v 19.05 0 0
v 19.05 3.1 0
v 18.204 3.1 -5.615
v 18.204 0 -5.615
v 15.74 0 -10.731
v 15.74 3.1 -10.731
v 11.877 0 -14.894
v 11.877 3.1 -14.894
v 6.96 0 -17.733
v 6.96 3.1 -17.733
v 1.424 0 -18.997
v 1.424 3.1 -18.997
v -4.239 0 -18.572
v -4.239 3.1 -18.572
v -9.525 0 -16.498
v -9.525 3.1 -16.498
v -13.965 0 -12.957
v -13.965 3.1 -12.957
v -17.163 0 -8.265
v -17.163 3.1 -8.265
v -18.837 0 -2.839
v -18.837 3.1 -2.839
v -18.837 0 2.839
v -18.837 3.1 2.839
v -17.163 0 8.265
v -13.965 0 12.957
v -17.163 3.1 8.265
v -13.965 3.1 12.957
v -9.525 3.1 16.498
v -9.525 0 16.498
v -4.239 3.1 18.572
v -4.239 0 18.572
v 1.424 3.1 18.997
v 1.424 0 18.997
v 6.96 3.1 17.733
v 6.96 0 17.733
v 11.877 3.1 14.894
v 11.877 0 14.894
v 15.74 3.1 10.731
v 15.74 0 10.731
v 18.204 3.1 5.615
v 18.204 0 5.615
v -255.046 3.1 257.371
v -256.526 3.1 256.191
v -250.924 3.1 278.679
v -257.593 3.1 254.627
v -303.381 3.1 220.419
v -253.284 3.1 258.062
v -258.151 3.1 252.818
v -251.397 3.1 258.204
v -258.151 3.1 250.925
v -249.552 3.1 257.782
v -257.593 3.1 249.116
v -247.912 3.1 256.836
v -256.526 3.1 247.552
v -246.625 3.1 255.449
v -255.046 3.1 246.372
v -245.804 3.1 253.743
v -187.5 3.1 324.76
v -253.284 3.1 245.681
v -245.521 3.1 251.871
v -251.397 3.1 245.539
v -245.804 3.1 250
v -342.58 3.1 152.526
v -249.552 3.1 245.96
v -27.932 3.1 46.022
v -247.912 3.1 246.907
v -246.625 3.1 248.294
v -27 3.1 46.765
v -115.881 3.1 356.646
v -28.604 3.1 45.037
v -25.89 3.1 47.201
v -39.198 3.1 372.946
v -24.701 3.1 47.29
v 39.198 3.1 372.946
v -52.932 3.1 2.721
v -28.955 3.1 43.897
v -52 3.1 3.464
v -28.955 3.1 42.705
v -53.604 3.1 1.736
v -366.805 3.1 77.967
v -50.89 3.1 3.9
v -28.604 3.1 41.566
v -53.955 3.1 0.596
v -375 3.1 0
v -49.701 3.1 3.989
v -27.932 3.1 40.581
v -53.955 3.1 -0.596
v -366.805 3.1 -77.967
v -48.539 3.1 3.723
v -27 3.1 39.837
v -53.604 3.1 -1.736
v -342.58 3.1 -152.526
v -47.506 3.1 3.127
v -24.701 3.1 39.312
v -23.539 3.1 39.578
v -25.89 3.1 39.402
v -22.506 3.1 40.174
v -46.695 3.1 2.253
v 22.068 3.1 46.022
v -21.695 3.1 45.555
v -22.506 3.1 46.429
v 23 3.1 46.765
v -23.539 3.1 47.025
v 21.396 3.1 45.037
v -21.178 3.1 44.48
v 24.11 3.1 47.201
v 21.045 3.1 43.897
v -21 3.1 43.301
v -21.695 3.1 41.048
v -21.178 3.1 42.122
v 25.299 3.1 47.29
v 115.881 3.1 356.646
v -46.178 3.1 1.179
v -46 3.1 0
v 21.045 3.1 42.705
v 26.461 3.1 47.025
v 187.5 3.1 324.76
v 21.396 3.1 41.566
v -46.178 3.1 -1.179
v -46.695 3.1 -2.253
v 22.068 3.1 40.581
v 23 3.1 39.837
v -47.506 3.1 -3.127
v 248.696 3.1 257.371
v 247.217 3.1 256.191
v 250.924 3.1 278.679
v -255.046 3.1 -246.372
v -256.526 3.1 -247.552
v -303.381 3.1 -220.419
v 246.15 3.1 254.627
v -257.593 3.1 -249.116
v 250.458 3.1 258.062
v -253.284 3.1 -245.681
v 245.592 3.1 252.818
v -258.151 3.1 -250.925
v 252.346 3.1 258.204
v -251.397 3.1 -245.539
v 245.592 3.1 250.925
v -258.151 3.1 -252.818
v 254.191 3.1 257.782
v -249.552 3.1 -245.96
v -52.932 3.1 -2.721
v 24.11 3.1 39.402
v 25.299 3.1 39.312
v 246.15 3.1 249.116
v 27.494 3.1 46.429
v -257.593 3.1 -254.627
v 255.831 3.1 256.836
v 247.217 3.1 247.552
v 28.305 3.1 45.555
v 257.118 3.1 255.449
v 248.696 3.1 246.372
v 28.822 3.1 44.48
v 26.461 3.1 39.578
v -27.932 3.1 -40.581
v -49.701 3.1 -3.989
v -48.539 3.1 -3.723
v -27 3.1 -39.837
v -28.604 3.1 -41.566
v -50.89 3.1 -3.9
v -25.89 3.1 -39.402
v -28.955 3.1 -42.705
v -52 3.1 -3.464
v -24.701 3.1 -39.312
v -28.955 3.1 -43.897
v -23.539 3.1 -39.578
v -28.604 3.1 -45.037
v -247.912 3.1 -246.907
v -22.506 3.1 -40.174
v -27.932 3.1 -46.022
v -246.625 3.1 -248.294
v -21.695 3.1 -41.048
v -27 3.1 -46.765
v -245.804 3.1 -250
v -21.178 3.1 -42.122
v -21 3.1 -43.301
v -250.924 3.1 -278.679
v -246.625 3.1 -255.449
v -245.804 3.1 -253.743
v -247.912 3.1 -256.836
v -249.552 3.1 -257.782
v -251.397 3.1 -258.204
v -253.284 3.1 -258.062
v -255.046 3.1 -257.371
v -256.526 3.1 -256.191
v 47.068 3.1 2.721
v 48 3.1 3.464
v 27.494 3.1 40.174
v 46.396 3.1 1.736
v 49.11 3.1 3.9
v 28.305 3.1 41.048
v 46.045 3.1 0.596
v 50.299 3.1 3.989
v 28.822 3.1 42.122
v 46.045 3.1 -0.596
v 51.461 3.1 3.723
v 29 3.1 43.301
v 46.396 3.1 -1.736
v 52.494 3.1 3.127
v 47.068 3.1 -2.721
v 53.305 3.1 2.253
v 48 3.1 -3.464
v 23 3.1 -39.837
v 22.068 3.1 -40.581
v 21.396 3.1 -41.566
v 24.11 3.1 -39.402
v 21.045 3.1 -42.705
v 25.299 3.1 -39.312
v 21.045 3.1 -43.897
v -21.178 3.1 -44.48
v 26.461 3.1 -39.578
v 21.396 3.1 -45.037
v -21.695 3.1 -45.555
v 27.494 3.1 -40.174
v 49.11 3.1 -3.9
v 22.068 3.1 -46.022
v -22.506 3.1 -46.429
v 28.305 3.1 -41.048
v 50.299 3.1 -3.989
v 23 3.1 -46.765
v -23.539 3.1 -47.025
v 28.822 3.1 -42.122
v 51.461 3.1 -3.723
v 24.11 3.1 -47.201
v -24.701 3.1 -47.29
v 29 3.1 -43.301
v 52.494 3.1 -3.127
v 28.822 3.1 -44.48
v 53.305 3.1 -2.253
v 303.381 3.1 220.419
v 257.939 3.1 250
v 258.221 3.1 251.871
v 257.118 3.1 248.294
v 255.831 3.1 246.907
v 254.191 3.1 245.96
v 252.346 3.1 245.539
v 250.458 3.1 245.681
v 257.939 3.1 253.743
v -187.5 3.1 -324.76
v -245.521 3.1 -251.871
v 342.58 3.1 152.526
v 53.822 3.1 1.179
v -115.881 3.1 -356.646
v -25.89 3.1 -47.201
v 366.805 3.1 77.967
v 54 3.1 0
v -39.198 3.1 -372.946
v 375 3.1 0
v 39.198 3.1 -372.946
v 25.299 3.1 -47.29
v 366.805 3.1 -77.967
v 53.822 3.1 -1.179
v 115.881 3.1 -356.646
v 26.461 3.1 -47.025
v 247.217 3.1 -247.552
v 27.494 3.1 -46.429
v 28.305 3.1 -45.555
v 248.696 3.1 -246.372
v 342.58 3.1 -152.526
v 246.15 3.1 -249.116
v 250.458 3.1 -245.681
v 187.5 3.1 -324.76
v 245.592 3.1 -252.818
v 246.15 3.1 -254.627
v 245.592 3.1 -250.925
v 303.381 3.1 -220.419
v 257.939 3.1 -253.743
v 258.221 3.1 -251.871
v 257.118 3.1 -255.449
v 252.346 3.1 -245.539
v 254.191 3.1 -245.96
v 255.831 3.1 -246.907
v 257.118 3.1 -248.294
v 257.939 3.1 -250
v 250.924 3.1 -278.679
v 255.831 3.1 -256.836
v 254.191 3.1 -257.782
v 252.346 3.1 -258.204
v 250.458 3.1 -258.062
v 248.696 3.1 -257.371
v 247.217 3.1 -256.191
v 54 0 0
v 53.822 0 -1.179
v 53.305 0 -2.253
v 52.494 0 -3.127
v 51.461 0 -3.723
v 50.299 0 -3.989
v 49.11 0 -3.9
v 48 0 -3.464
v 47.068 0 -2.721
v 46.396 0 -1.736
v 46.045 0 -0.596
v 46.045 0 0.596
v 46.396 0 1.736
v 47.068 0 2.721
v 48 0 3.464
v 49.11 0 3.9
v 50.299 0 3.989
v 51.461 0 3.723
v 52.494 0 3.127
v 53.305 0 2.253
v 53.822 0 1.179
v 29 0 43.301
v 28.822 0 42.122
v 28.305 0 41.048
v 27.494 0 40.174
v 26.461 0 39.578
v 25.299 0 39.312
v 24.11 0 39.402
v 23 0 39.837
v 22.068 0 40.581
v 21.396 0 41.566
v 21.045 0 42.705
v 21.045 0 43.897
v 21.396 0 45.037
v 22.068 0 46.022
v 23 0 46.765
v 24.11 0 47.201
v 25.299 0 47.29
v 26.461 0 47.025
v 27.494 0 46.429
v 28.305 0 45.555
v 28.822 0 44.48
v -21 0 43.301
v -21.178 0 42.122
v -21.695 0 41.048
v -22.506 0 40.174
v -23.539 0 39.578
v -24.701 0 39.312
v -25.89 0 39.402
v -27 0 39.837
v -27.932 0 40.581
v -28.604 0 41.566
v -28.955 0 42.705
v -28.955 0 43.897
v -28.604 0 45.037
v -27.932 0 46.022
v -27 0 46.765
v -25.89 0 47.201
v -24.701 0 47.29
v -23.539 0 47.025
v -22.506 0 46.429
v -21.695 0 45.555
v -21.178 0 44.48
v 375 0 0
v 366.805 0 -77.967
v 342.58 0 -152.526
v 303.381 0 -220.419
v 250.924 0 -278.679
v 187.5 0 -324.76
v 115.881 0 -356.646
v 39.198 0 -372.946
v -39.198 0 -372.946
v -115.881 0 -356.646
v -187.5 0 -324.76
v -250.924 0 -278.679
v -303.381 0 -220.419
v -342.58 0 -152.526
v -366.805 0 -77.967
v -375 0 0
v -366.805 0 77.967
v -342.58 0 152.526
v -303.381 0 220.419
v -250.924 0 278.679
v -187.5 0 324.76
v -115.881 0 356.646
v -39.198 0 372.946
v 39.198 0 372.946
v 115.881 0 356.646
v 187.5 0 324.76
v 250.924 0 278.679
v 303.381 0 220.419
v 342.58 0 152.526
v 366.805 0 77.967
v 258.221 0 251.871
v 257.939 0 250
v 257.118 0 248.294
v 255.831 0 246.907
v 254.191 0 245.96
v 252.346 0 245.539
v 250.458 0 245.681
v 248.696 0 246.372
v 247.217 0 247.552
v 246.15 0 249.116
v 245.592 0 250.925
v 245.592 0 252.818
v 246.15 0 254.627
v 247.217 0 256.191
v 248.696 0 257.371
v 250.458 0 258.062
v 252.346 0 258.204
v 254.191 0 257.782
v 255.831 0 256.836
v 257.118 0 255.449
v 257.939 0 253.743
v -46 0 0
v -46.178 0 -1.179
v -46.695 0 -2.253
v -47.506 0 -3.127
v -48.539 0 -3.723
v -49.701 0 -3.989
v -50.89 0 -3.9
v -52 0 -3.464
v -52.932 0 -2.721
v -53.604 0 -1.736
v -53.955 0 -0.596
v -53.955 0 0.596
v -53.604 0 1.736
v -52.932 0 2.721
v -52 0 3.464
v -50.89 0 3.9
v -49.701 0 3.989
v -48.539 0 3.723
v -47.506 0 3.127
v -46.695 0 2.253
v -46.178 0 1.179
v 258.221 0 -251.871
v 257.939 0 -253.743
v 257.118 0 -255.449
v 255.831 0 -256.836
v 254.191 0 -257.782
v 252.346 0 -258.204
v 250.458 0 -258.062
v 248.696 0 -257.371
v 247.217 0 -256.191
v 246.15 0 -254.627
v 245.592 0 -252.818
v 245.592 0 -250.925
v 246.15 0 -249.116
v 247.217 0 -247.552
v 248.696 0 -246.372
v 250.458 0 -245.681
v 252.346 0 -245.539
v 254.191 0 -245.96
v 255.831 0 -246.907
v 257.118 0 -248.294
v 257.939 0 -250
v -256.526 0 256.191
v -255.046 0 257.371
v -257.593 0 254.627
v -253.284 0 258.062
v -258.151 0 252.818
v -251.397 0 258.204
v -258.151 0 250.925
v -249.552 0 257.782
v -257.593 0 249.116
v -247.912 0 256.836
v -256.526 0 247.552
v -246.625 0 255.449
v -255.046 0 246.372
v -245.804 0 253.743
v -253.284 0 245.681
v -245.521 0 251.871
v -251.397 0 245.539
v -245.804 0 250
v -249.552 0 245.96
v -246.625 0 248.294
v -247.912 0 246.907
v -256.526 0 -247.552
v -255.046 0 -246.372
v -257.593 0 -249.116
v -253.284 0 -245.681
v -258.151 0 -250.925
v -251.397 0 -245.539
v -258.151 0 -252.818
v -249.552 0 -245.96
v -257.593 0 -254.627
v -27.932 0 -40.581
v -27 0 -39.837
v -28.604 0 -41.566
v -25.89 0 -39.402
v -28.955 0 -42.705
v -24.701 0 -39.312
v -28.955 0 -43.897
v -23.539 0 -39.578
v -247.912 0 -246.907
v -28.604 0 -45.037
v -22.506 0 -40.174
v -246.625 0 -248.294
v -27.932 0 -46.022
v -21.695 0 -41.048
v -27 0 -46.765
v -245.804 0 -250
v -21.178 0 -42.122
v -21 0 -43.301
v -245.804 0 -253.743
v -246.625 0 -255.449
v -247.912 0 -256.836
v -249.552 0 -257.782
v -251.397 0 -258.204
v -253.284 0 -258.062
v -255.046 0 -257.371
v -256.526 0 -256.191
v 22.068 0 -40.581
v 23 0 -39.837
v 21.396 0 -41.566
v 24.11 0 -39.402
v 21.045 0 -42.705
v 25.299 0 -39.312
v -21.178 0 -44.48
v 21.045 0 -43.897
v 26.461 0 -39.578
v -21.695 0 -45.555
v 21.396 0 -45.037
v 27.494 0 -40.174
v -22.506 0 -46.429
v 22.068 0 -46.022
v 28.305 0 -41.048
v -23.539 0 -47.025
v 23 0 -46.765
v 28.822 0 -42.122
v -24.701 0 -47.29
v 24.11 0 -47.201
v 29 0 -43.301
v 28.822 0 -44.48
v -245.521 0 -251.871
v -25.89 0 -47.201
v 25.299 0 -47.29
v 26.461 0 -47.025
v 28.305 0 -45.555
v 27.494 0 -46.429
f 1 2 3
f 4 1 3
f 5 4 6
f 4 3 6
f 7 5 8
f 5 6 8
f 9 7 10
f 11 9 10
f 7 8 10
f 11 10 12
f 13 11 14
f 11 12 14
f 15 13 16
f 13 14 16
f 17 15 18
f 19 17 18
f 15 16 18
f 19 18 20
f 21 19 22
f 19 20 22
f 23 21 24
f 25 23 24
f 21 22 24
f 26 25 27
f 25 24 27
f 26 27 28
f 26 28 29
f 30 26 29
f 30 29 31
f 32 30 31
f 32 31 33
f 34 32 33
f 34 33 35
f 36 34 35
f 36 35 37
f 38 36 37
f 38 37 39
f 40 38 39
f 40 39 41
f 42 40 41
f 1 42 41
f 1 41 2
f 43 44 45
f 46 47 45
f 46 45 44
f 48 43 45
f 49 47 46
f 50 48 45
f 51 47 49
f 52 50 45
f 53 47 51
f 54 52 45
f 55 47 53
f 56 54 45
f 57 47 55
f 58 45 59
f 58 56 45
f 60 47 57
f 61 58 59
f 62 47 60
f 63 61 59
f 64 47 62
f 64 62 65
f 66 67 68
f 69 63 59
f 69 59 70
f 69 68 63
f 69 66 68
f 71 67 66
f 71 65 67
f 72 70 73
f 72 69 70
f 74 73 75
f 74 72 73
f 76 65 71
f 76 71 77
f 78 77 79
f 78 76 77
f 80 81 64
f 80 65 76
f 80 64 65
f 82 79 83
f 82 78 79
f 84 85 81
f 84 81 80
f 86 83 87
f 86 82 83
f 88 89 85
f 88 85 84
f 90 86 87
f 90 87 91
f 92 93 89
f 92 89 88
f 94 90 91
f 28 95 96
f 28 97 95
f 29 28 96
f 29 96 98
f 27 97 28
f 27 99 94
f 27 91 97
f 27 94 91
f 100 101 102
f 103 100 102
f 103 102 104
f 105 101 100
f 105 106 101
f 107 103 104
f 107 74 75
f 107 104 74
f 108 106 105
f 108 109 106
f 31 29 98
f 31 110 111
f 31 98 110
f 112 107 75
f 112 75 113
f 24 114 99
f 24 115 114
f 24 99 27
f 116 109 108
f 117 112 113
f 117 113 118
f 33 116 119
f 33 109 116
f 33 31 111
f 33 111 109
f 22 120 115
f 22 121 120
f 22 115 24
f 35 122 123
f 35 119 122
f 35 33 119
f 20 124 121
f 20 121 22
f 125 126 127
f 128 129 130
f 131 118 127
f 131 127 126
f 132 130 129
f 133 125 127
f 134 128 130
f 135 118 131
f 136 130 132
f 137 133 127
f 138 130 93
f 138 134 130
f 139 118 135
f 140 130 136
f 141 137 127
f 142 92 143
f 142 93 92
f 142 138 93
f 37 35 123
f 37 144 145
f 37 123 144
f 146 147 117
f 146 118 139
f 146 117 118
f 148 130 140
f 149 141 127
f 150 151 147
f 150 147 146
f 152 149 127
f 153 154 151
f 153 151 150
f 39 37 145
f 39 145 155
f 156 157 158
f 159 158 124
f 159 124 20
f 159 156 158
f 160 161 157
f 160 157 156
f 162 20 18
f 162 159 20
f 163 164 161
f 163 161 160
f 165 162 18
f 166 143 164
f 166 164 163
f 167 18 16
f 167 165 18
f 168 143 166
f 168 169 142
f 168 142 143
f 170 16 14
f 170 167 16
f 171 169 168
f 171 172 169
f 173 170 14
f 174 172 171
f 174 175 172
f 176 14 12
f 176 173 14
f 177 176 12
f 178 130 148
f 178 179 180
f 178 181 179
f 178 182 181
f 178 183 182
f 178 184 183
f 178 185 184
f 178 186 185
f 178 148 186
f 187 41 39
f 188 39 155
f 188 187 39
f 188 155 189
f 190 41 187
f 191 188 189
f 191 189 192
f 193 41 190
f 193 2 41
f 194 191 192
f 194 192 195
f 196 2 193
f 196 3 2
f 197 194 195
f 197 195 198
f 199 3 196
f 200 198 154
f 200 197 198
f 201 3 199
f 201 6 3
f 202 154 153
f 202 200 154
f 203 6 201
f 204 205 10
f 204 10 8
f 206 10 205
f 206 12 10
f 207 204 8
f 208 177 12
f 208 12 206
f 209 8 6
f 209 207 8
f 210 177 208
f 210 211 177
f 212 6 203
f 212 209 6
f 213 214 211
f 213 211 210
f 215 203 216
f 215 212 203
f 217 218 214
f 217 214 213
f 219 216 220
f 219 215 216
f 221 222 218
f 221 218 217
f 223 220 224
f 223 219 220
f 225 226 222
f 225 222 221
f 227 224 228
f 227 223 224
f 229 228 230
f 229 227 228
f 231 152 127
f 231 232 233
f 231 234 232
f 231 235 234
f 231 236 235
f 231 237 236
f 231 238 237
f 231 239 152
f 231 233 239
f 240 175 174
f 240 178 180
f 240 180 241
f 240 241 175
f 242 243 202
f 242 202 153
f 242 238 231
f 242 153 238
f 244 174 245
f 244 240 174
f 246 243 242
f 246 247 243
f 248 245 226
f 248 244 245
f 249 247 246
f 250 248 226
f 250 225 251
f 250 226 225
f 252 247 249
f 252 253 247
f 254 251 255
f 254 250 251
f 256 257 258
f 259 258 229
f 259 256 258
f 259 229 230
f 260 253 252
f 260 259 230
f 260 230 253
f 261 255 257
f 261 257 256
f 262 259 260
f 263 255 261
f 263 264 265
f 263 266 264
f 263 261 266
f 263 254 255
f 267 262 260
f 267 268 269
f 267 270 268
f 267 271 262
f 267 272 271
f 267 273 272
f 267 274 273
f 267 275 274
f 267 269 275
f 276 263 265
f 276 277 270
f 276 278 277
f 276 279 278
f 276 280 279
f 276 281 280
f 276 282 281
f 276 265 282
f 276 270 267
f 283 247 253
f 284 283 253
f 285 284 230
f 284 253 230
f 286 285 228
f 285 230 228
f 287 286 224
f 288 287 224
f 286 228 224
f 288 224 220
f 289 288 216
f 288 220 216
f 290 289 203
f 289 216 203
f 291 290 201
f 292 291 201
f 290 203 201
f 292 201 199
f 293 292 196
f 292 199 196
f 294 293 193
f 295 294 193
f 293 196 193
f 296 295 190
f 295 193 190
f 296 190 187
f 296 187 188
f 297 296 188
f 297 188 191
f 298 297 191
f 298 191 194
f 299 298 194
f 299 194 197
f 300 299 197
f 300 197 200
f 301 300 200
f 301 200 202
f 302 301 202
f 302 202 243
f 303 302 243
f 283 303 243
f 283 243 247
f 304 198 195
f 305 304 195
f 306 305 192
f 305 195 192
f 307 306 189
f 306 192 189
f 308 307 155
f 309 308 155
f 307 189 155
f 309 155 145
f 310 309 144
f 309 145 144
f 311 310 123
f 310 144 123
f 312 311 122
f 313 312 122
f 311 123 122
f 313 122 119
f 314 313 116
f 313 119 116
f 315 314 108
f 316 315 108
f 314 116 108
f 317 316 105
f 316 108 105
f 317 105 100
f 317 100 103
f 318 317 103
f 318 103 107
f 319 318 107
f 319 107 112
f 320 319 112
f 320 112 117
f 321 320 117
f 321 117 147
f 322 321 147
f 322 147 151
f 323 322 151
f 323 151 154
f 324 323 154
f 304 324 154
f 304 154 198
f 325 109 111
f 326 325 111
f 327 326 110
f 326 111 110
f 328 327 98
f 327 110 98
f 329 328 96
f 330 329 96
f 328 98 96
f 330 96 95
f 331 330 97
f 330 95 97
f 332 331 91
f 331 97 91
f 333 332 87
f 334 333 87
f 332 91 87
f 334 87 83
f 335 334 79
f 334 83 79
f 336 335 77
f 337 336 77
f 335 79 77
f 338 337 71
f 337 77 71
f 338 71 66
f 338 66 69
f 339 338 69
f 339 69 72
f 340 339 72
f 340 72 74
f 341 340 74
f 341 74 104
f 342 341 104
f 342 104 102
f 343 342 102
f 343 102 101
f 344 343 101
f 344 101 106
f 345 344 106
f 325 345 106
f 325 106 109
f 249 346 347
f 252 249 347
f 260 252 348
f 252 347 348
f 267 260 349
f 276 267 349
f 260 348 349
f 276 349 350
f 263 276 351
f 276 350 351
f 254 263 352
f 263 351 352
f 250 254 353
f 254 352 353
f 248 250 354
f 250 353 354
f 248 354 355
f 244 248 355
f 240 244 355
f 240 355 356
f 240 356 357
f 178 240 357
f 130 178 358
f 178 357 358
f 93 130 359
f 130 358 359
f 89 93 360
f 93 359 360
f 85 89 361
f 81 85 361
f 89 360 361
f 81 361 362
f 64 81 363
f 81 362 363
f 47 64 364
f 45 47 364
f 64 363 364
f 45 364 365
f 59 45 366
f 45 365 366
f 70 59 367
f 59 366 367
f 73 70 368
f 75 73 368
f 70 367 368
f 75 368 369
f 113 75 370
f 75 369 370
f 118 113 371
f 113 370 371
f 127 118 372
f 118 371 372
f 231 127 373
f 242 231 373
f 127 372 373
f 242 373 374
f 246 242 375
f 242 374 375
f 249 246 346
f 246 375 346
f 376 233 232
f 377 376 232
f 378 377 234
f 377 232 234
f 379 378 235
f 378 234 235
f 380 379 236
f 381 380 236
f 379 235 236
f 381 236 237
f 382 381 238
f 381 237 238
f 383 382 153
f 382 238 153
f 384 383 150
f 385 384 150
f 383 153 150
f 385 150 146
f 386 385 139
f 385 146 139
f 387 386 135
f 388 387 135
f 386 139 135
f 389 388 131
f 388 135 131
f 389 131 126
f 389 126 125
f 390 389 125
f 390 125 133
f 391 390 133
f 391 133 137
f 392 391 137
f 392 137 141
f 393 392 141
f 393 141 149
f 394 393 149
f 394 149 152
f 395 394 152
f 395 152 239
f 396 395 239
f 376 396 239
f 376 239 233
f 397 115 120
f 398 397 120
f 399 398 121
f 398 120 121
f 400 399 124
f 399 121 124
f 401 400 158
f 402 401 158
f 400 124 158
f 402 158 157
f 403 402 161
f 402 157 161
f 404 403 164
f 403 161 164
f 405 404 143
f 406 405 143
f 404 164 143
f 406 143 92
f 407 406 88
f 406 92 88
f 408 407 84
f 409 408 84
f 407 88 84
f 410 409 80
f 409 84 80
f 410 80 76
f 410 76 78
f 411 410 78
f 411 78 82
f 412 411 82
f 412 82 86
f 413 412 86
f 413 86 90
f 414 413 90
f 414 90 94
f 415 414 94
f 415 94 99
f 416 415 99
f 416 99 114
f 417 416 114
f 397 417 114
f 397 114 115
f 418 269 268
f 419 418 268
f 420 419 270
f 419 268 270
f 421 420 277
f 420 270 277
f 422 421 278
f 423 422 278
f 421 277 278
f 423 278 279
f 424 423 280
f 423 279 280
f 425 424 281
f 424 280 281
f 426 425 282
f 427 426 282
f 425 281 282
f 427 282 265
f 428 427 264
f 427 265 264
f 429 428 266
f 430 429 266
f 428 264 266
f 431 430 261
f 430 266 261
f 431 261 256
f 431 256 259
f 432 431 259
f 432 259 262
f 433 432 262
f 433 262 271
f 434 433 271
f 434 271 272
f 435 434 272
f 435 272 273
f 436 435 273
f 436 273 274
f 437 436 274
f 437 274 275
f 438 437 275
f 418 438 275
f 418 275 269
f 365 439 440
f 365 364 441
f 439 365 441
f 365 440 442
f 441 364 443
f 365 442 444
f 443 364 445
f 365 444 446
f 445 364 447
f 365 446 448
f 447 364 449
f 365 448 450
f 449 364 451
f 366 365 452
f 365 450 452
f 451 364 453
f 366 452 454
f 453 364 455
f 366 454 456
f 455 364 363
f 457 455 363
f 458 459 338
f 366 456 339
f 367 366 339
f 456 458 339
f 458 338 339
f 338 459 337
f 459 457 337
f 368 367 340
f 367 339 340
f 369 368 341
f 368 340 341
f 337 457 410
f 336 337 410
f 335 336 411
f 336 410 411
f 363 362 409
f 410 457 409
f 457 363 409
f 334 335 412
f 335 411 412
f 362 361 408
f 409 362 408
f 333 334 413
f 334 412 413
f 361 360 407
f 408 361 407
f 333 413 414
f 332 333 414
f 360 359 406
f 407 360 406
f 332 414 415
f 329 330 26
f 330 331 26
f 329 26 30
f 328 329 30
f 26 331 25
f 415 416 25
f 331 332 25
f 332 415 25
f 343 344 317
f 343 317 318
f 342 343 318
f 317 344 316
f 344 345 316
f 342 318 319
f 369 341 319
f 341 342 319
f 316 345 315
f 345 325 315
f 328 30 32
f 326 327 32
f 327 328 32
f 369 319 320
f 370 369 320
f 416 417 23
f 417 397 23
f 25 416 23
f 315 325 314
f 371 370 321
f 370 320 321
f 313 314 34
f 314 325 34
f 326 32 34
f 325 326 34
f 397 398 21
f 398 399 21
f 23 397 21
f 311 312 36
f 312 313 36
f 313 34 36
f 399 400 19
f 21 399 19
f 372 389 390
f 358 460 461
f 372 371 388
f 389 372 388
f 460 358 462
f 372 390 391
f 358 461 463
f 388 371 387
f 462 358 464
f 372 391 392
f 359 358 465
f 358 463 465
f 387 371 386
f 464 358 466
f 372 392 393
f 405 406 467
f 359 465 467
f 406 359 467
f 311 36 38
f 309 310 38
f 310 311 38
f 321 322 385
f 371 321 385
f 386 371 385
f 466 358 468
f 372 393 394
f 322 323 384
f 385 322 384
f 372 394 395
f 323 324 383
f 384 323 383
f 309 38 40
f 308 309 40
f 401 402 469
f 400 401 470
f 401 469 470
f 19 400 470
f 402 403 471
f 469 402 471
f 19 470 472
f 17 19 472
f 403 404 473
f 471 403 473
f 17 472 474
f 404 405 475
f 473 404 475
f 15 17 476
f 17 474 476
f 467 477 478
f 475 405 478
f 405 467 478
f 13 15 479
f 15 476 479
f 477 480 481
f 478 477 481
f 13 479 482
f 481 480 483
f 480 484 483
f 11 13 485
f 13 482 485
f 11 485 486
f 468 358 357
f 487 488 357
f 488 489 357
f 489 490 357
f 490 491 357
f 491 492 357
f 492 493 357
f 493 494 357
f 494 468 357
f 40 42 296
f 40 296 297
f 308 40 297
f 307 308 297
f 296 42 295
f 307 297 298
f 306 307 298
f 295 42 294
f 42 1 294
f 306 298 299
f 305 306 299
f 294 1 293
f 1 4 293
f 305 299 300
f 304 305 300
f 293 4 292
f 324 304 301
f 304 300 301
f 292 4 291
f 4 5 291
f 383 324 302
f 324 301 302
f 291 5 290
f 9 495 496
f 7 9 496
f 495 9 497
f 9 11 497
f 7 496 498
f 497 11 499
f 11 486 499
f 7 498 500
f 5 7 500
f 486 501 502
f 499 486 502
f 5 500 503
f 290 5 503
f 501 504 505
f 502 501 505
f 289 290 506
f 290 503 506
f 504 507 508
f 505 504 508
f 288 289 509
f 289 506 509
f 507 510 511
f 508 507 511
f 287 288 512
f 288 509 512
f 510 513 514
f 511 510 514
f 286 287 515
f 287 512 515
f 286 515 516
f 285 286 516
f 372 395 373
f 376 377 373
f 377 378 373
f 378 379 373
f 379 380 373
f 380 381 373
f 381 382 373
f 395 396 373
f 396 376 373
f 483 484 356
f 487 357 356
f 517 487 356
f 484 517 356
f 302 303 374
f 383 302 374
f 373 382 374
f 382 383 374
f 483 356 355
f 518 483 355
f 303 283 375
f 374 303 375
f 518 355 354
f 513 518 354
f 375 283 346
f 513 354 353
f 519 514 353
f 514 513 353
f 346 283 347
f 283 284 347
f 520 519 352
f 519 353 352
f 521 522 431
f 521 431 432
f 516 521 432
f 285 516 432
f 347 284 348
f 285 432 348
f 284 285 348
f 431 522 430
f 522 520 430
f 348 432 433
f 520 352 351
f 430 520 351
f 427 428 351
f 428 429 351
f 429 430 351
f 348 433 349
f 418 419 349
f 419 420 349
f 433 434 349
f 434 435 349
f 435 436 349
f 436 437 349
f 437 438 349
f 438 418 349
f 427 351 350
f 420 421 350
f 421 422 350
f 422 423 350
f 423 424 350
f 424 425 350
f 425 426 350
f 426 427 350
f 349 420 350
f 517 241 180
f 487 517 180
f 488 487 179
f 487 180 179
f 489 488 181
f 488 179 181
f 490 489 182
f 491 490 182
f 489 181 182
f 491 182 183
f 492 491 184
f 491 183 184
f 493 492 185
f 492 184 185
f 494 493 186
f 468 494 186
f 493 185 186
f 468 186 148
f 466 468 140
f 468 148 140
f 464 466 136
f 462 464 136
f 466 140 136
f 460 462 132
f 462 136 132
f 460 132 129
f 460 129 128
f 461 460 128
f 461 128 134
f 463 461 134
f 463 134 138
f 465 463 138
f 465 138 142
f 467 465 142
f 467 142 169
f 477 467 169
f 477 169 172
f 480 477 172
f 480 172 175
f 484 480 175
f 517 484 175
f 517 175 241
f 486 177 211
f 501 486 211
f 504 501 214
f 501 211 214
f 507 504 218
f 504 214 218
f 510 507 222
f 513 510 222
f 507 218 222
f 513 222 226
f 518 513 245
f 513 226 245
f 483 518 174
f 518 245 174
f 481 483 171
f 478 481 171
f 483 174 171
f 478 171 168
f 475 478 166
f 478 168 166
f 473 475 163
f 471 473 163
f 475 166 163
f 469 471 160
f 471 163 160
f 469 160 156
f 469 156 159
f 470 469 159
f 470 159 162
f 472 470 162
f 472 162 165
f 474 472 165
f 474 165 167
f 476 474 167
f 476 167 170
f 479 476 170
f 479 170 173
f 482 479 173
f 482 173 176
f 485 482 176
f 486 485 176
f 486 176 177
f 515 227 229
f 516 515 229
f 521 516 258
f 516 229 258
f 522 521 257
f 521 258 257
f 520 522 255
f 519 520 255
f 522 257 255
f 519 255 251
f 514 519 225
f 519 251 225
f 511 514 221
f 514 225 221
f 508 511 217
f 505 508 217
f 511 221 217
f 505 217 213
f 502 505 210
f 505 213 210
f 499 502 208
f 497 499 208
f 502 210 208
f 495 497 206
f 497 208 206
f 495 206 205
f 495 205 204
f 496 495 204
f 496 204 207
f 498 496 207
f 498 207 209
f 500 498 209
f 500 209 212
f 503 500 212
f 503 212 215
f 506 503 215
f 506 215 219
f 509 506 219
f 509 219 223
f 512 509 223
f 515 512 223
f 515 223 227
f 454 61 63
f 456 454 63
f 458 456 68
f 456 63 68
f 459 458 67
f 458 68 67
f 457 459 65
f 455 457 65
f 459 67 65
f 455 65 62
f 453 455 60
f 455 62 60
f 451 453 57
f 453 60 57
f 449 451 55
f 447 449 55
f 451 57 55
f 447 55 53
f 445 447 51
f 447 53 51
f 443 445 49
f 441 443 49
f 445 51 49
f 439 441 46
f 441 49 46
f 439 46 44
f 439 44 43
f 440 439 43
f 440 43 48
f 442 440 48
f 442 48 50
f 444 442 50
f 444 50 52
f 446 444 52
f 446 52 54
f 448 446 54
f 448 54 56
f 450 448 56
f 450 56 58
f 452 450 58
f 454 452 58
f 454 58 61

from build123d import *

# Parameters (mm, degrees)
CROQUIS1_R              = 375
SALIENTE_EXTRUIR1_DEPTH = 3.1
CROQUIS3_R              = 6.35
CROQUIS3_R_2            = 19.05
CORTAR_EXTRUIR2_DEPTH   = 4.1
CROQUIS4_R              = 4
CORTAR_EXTRUIR3_DEPTH   = 4.1


with BuildPart() as part:
    # Croquis1 → Saliente-Extruir1 (new body)
    with BuildSketch(Plane(origin=(0, 0, 0), x_dir=(1, 0, 0), z_dir=(0, 1, 0))):
        Circle(CROQUIS1_R)
    extrude(amount=SALIENTE_EXTRUIR1_DEPTH)

    # Croquis3 → Cortar-Extruir2 (cut, through all)
    with BuildSketch(Plane(origin=(0, 3.1, 0), x_dir=(1, 0, 0), z_dir=(0, 1, 0))):
        with Locations((-251.871435459, -251.871435459)):
            Circle(CROQUIS3_R)
        with Locations((-251.871435459, 251.871435459)):
            Circle(CROQUIS3_R)
        with Locations((251.871435459, 251.871435459)):
            Circle(CROQUIS3_R)
        with Locations((251.871435459, -251.871435459)):
            Circle(CROQUIS3_R)
        Circle(CROQUIS3_R_2)
    extrude(amount=-CORTAR_EXTRUIR2_DEPTH, mode=Mode.SUBTRACT)

    # Croquis4 → Cortar-Extruir3 (cut, through all)
    with BuildSketch(Plane(origin=(0, 3.1, 0), x_dir=(1, 0, 0), z_dir=(0, 1, 0))):
        with Locations((50, 0)):
            Circle(CROQUIS4_R)
        with Locations((25, -43.301270189)):
            Circle(CROQUIS4_R)
        with Locations((-25, -43.301270189)):
            Circle(CROQUIS4_R)
        with Locations((-50, 0)):
            Circle(CROQUIS4_R)
        with Locations((-25, 43.301270189)):
            Circle(CROQUIS4_R)
        with Locations((25, 43.301270189)):
            Circle(CROQUIS4_R)
    extrude(amount=-CORTAR_EXTRUIR3_DEPTH, mode=Mode.SUBTRACT)


solid = part.part
